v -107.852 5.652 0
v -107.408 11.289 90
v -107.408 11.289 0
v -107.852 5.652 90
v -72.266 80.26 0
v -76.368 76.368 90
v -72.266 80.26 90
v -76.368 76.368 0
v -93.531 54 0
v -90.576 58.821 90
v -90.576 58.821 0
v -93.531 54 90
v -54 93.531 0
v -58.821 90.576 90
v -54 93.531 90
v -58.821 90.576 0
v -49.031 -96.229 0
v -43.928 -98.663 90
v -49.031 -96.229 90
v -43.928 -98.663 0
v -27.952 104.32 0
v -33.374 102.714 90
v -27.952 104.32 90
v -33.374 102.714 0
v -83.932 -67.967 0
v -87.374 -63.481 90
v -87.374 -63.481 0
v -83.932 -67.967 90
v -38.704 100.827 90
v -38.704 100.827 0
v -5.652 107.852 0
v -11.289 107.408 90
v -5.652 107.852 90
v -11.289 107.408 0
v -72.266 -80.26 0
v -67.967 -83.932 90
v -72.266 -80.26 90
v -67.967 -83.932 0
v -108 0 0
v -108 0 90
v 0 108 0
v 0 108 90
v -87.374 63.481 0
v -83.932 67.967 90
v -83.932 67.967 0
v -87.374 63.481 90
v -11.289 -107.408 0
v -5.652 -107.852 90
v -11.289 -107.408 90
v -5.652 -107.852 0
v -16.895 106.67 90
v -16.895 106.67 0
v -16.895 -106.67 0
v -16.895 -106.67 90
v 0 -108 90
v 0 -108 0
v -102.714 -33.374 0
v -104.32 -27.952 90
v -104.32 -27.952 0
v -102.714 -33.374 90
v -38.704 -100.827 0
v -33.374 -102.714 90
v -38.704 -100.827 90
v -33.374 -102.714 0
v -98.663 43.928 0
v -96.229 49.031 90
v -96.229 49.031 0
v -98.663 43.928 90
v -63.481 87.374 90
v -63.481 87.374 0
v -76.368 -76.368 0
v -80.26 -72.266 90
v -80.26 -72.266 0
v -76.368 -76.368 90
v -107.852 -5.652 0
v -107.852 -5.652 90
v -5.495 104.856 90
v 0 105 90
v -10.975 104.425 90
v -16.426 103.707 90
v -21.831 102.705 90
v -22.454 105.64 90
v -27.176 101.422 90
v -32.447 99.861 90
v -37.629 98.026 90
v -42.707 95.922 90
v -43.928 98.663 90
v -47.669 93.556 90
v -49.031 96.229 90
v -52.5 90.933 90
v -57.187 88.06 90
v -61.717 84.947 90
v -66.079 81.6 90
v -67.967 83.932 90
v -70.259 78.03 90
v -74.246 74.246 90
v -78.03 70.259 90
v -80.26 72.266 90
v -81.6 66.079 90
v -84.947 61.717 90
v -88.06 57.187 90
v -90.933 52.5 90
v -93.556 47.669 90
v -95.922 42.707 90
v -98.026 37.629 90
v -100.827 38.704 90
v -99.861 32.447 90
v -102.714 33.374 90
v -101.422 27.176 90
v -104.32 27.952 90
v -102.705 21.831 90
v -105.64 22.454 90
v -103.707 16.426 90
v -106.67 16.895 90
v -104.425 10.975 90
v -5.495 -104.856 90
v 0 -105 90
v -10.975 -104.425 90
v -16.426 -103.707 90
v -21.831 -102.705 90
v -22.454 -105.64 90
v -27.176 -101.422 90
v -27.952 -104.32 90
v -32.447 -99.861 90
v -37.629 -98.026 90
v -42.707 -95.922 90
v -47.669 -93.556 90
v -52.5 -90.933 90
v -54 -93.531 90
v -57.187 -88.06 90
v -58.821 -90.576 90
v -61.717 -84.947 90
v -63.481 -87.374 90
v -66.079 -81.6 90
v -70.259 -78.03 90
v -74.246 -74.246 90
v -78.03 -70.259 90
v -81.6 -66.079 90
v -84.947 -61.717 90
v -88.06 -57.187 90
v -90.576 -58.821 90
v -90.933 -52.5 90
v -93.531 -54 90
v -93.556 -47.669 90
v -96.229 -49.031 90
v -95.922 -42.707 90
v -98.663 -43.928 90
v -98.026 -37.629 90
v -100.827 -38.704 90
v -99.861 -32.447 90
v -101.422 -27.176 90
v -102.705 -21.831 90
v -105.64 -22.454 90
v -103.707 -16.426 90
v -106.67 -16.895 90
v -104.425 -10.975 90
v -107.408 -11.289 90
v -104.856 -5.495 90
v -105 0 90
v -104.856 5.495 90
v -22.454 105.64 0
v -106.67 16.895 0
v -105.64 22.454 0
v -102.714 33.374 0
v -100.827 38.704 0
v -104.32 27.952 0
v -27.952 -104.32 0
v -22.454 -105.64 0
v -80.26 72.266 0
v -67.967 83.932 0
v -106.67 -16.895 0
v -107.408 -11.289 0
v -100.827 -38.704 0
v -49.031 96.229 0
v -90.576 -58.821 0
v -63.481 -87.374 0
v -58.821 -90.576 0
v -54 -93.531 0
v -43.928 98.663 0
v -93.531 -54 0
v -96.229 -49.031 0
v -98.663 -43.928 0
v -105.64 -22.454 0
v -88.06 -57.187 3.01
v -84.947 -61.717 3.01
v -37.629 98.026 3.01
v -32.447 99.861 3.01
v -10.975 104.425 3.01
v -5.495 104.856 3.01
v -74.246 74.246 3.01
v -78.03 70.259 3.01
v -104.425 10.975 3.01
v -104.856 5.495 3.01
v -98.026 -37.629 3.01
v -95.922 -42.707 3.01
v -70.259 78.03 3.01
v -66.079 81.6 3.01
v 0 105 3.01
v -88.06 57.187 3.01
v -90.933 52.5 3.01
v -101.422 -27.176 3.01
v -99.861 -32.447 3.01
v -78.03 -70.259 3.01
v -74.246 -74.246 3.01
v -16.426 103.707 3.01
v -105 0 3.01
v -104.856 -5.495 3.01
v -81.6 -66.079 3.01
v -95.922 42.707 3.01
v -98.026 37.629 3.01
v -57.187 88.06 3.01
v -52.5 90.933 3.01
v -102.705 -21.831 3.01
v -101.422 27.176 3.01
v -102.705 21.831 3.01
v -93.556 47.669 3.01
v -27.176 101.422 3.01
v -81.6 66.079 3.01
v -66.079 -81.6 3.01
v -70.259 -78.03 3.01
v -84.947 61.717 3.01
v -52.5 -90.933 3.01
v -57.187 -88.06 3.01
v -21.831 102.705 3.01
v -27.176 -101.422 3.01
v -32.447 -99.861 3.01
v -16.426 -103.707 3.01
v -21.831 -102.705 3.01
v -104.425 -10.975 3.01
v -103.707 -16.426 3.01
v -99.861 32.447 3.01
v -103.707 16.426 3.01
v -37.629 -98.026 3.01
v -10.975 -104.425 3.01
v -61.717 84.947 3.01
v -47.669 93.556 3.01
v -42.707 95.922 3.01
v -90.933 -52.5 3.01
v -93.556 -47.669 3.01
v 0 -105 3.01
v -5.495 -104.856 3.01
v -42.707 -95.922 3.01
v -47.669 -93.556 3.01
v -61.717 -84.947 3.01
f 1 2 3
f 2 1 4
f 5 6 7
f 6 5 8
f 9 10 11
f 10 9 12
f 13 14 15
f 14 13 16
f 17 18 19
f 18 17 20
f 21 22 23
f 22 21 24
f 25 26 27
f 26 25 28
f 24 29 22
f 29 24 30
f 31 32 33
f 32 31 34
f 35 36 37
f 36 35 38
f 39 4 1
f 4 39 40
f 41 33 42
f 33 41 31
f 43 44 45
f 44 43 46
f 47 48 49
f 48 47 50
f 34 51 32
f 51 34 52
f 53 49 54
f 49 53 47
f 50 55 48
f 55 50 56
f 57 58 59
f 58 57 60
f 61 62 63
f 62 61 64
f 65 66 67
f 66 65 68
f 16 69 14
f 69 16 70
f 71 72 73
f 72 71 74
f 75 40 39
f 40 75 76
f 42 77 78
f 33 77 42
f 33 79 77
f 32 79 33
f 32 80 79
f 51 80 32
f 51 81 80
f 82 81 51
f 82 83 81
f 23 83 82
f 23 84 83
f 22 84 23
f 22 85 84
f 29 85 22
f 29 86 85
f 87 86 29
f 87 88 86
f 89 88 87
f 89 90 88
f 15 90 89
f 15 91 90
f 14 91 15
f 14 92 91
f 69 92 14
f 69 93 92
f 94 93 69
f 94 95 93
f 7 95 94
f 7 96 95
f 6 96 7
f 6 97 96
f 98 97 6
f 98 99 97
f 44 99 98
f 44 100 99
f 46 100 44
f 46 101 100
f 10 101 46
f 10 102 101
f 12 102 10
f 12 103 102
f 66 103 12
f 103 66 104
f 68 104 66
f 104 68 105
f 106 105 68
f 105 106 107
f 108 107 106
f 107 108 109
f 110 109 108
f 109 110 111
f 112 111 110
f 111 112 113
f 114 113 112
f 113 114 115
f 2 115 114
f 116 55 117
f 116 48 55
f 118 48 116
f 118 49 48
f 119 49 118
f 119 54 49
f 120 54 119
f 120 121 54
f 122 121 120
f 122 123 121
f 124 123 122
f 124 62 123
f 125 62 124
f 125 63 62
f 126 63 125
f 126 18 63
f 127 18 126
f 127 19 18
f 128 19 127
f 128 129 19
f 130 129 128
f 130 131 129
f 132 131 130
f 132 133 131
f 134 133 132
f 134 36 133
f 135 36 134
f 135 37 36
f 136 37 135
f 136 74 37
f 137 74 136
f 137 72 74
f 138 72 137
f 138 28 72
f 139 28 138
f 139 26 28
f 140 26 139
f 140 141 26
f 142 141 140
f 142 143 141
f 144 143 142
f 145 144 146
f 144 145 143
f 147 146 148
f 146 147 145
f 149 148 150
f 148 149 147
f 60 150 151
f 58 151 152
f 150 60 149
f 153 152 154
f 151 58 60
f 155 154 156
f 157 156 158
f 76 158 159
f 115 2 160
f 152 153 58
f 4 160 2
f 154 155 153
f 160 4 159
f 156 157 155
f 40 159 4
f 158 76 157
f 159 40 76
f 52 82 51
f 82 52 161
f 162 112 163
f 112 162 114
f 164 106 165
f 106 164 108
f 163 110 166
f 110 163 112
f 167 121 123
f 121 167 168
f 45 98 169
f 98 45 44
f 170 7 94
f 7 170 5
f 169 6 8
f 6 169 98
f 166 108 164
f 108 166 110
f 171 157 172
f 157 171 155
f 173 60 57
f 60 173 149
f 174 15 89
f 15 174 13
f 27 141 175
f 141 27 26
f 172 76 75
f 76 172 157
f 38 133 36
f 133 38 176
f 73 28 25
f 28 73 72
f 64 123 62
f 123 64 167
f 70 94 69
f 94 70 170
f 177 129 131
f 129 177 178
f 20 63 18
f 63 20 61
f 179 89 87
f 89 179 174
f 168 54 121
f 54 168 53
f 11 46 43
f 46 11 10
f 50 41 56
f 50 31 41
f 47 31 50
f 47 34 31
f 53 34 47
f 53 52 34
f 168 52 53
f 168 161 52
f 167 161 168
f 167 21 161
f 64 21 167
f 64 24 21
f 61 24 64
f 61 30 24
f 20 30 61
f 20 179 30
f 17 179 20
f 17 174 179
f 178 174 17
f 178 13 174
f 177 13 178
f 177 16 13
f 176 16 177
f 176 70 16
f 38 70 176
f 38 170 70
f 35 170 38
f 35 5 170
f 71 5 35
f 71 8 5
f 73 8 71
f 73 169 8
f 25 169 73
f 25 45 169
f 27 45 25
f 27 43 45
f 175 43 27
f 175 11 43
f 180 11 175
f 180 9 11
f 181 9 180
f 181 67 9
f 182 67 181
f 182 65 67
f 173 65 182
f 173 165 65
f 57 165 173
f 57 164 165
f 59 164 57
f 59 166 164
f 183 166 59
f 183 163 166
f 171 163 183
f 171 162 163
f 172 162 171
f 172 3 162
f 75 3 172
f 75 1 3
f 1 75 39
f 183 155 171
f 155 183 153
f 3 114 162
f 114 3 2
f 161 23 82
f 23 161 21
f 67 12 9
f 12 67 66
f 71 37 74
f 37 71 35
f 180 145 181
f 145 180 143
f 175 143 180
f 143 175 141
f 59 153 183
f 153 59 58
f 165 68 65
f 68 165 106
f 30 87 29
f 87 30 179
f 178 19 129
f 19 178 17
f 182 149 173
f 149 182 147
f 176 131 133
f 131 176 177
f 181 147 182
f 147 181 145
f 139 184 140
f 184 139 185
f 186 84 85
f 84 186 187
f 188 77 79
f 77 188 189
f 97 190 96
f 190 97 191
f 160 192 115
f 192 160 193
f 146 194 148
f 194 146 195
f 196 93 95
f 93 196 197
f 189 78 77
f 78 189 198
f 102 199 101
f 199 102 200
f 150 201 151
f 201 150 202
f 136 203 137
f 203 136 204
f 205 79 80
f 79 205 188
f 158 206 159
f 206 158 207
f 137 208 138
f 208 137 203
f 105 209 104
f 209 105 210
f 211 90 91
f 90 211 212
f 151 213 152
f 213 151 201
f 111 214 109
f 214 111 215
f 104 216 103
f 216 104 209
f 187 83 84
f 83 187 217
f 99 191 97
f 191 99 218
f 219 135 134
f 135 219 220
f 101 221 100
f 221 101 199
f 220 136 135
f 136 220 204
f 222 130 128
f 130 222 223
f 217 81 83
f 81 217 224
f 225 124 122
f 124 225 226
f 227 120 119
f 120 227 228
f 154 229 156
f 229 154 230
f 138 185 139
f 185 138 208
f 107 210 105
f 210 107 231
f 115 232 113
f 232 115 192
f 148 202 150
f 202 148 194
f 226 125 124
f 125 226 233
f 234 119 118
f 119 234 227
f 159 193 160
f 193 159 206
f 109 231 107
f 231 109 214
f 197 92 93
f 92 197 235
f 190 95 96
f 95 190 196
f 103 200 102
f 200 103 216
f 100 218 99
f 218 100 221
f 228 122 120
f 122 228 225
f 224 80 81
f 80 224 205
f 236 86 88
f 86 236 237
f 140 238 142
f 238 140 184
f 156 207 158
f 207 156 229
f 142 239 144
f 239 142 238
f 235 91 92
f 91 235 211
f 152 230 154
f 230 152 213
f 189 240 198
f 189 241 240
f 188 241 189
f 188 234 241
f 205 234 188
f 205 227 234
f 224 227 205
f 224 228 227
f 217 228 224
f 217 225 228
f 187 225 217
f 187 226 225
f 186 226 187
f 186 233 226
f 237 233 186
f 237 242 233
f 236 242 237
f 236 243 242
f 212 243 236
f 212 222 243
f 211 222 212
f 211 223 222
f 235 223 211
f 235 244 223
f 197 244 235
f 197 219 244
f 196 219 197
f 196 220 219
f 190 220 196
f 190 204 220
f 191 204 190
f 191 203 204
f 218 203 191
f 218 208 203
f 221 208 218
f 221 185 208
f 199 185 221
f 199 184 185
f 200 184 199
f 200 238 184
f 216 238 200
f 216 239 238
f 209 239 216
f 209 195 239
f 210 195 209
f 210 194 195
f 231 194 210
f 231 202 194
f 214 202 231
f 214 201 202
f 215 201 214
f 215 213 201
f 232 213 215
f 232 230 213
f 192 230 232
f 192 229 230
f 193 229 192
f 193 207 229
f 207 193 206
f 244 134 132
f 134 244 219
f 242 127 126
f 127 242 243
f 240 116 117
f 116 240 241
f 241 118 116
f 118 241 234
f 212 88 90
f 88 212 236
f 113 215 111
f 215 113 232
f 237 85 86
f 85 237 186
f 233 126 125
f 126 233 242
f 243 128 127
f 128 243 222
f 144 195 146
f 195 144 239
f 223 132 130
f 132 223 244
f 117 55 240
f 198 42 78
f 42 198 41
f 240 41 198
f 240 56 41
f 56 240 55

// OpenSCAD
h = 90;
d = 210;
wall_thickness = 3;
reinforcement = 5;
$fn = 120;

difference() {
    cylinder(h = h, d = d + wall_thickness*2);
    translate([0,0,wall_thickness+.01]) cylinder(h = (h-wall_thickness), d = d);
//    translate([0,0,wall_thickness]) cylinder(h = (h-wall_thickness)/5*2, d = d);
//    translate([0,0,(h-wall_thickness)/5*3]) cylinder(h = h/5*3+wall_thickness, d = d);
    translate([0, -d/2-5, -.01]) cube([d+10, d+10, h+.02]);
}
